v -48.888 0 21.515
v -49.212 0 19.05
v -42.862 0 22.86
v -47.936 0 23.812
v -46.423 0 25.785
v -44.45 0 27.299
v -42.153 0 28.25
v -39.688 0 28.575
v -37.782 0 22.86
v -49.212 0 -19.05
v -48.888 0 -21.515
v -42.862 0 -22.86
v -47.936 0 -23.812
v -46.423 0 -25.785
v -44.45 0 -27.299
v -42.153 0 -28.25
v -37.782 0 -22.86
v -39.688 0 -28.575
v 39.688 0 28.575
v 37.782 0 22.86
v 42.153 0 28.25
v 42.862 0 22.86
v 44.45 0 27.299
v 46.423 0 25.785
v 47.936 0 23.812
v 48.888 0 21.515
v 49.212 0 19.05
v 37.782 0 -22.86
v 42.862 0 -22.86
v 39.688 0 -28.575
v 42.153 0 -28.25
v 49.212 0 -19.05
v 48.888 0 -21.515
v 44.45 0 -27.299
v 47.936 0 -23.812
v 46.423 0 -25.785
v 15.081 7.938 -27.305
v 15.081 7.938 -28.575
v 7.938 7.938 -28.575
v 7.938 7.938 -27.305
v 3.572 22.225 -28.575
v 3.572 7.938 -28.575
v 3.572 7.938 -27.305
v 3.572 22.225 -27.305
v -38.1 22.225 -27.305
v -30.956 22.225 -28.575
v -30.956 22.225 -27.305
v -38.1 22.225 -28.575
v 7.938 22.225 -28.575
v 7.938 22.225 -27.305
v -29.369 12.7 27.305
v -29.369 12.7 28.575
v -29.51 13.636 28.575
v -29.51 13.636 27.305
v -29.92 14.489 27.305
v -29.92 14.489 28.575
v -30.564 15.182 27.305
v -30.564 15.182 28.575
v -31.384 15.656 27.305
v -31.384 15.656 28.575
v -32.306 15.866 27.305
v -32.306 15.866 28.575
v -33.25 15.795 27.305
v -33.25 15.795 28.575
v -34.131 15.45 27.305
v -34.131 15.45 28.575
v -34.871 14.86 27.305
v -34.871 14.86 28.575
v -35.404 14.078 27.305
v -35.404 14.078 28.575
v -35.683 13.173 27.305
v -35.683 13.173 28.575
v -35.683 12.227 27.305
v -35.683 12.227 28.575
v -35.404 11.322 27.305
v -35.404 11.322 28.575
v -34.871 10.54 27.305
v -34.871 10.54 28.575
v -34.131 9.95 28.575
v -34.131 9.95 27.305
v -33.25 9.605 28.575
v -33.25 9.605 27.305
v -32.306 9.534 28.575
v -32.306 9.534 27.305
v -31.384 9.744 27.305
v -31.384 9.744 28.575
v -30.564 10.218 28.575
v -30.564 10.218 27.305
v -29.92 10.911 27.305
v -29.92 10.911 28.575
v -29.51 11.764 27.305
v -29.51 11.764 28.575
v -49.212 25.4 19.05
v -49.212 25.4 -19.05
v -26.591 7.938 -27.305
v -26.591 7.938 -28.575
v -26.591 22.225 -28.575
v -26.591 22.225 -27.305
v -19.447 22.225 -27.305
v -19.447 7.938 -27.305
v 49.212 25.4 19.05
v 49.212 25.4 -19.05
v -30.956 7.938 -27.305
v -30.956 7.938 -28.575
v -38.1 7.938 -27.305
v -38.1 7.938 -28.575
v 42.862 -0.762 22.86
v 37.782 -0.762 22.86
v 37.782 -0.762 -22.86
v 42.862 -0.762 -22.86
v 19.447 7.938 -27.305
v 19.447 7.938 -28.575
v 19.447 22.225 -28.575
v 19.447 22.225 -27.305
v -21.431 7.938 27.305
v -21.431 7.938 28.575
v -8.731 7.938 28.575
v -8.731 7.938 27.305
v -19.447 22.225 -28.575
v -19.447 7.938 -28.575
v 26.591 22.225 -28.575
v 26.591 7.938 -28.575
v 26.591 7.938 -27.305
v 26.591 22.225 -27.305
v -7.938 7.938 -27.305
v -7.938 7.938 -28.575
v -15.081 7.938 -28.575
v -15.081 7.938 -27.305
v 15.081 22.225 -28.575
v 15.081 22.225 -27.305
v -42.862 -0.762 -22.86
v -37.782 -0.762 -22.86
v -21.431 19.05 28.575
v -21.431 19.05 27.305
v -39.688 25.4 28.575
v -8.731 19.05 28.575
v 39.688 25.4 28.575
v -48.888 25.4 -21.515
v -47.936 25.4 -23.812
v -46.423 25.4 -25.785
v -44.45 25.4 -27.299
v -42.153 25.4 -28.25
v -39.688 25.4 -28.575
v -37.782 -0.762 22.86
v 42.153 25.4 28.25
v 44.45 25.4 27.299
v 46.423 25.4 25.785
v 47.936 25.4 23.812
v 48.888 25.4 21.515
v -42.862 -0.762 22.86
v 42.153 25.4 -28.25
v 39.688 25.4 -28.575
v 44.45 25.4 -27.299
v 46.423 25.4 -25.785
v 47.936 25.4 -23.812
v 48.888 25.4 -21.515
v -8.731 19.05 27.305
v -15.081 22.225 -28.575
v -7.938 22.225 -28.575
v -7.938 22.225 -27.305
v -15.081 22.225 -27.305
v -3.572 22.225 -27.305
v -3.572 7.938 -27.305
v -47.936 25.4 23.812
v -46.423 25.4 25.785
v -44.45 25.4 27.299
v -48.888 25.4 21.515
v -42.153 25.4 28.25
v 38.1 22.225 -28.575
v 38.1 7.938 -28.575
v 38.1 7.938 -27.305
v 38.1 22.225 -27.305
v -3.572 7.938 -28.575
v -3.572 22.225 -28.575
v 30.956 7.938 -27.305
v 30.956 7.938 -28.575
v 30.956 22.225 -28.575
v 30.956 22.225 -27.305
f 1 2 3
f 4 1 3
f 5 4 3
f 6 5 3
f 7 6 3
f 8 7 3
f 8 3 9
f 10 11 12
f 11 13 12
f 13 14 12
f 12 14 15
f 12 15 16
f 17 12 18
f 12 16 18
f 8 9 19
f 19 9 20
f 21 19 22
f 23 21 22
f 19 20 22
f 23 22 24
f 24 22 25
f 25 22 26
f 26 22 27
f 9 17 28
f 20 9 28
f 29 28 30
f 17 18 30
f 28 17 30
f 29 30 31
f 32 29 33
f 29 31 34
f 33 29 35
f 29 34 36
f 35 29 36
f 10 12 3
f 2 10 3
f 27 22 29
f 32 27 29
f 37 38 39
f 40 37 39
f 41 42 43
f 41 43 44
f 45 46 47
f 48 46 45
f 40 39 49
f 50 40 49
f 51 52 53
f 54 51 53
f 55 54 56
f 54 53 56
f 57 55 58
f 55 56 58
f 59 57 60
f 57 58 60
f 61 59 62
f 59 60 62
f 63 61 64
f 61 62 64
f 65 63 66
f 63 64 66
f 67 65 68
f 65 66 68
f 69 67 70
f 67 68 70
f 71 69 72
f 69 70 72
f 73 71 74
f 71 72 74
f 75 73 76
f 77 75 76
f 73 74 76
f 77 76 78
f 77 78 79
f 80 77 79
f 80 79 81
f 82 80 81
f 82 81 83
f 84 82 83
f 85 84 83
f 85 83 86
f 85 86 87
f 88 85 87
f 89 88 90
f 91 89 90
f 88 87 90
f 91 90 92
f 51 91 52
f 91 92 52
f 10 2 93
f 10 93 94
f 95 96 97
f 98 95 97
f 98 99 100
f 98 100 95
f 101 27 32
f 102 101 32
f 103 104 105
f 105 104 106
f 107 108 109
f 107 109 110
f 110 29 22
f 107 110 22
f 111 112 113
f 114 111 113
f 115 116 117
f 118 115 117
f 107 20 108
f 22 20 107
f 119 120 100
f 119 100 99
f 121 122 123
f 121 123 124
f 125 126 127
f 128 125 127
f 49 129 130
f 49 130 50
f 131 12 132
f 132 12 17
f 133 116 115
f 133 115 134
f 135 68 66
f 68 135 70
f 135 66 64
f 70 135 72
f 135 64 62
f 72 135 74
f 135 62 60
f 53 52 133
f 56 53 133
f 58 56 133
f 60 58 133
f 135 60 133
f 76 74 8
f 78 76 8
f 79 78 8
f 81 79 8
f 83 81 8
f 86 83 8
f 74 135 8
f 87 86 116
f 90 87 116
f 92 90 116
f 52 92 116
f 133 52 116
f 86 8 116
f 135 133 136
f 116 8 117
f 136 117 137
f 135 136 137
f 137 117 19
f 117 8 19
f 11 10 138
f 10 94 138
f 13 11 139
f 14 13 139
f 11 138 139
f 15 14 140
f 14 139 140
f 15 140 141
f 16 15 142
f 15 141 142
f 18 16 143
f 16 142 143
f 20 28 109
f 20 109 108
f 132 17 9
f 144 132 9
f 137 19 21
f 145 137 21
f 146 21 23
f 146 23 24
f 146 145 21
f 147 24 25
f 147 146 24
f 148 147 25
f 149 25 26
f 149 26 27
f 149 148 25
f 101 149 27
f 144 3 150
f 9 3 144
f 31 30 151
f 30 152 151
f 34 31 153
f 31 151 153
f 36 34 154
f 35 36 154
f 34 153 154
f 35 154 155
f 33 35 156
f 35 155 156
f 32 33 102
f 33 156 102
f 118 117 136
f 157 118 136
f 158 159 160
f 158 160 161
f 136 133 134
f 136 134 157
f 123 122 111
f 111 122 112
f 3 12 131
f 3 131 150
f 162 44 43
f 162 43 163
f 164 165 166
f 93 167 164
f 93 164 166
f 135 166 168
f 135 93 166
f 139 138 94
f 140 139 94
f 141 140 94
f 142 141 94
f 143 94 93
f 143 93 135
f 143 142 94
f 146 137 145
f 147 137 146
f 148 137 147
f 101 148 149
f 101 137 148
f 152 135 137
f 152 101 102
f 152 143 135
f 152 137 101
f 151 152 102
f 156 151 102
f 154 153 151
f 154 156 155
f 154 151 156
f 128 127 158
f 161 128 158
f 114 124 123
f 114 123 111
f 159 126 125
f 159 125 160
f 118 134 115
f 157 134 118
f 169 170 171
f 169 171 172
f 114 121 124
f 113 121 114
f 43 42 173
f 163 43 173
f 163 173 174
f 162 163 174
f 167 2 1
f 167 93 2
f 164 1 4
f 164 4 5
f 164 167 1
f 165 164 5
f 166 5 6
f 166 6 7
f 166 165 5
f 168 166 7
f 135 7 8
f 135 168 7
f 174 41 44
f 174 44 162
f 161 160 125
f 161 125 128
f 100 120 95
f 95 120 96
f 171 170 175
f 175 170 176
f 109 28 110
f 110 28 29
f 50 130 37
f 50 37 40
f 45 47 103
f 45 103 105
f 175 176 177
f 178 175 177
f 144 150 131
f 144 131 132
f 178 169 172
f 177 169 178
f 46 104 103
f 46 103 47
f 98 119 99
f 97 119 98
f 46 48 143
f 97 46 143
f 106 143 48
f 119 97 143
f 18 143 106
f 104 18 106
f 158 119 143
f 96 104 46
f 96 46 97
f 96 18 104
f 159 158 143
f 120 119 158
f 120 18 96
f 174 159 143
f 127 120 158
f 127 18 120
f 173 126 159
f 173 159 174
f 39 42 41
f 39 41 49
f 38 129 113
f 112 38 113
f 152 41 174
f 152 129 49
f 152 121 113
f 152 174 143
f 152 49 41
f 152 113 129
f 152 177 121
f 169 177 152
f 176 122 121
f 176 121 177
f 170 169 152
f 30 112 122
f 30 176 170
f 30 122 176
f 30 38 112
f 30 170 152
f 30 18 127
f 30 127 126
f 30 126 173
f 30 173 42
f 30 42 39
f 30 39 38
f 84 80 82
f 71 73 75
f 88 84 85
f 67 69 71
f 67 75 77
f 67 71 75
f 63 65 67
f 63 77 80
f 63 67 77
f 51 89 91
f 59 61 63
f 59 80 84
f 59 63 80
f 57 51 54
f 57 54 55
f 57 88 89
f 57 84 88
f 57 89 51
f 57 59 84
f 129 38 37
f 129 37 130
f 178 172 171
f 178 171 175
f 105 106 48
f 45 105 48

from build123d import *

# Parameters (mm, degrees)
SKETCH1_W           = 98.425
SKETCH1_H           = 57.15
BOSS_EXTRUDE1_DEPTH = 25.4
SKETCH2_W           = 5.08
SKETCH2_H           = 45.72
BOSS_EXTRUDE2_DEPTH = 0.762
FILLET1_R           = 9.525
SKETCH3_W           = 7.14375
SKETCH3_H           = 14.2875
CUT_EXTRUDE1_DEPTH  = 1.27
SKETCH4_R           = 3.175
SKETCH4_W           = 12.7
SKETCH4_H           = 11.1125
CUT_EXTRUDE2_DEPTH  = 1.27


with BuildPart() as part:
    # Sketch1 → Boss-Extrude1 (new body)
    with BuildSketch(Plane(origin=(0, 0, 0), x_dir=(1, 0, 0), z_dir=(0, 1, 0))):
        Rectangle(SKETCH1_W, SKETCH1_H)
    extrude(amount=BOSS_EXTRUDE1_DEPTH)

    # Sketch2 → Boss-Extrude2 (add)
    with BuildSketch(Plane.XZ):
        with Locations((-40.3225, 0)):
            Rectangle(SKETCH2_W, SKETCH2_H)
        with Locations((40.3225, 0)):
            Rectangle(SKETCH2_W, SKETCH2_H)
    extrude(amount=BOSS_EXTRUDE2_DEPTH)

    # Fillet1
    fillet1_edges = [part.edges().sort_by_distance(p)[0] for p in [
        (-49.2125, 12.7, -28.575),
        (49.2125, 12.7, -28.575),
        (49.2125, 12.7, 28.575),
        (-49.2125, 12.7, 28.575),
    ]]
    fillet(fillet1_edges, radius=FILLET1_R)

    # Sketch3 → Cut-Extrude1 (cut)
    with BuildSketch(Plane(origin=(0, 0, -28.575), x_dir=(-1, 0, 0), z_dir=(0, 0, -1))):
        with Locations((-34.528125, 15.08125)):
            Rectangle(SKETCH3_W, SKETCH3_H)
        with Locations((-23.01875, 15.08125)):
            Rectangle(SKETCH3_W, SKETCH3_H)
        with Locations((-11.509375, 15.08125)):
            Rectangle(SKETCH3_W, SKETCH3_H)
        with Locations((0, 15.08125)):
            Rectangle(SKETCH3_W, SKETCH3_H)
        with Locations((11.509375, 15.08125)):
            Rectangle(SKETCH3_W, SKETCH3_H)
        with Locations((23.01875, 15.08125)):
            Rectangle(SKETCH3_W, SKETCH3_H)
        with Locations((34.528125, 15.08125)):
            Rectangle(SKETCH3_W, SKETCH3_H)
    extrude(amount=-CUT_EXTRUDE1_DEPTH, mode=Mode.SUBTRACT)

    # Sketch4 → Cut-Extrude2 (cut)
    with BuildSketch(Plane.XY.offset(28.575)):
        with Locations((-32.54375, 12.7)):
            Circle(SKETCH4_R)
        with Locations((-15.08125, 13.49375)):
            Rectangle(SKETCH4_W, SKETCH4_H)
    extrude(amount=-CUT_EXTRUDE2_DEPTH, mode=Mode.SUBTRACT)


solid = part.part
